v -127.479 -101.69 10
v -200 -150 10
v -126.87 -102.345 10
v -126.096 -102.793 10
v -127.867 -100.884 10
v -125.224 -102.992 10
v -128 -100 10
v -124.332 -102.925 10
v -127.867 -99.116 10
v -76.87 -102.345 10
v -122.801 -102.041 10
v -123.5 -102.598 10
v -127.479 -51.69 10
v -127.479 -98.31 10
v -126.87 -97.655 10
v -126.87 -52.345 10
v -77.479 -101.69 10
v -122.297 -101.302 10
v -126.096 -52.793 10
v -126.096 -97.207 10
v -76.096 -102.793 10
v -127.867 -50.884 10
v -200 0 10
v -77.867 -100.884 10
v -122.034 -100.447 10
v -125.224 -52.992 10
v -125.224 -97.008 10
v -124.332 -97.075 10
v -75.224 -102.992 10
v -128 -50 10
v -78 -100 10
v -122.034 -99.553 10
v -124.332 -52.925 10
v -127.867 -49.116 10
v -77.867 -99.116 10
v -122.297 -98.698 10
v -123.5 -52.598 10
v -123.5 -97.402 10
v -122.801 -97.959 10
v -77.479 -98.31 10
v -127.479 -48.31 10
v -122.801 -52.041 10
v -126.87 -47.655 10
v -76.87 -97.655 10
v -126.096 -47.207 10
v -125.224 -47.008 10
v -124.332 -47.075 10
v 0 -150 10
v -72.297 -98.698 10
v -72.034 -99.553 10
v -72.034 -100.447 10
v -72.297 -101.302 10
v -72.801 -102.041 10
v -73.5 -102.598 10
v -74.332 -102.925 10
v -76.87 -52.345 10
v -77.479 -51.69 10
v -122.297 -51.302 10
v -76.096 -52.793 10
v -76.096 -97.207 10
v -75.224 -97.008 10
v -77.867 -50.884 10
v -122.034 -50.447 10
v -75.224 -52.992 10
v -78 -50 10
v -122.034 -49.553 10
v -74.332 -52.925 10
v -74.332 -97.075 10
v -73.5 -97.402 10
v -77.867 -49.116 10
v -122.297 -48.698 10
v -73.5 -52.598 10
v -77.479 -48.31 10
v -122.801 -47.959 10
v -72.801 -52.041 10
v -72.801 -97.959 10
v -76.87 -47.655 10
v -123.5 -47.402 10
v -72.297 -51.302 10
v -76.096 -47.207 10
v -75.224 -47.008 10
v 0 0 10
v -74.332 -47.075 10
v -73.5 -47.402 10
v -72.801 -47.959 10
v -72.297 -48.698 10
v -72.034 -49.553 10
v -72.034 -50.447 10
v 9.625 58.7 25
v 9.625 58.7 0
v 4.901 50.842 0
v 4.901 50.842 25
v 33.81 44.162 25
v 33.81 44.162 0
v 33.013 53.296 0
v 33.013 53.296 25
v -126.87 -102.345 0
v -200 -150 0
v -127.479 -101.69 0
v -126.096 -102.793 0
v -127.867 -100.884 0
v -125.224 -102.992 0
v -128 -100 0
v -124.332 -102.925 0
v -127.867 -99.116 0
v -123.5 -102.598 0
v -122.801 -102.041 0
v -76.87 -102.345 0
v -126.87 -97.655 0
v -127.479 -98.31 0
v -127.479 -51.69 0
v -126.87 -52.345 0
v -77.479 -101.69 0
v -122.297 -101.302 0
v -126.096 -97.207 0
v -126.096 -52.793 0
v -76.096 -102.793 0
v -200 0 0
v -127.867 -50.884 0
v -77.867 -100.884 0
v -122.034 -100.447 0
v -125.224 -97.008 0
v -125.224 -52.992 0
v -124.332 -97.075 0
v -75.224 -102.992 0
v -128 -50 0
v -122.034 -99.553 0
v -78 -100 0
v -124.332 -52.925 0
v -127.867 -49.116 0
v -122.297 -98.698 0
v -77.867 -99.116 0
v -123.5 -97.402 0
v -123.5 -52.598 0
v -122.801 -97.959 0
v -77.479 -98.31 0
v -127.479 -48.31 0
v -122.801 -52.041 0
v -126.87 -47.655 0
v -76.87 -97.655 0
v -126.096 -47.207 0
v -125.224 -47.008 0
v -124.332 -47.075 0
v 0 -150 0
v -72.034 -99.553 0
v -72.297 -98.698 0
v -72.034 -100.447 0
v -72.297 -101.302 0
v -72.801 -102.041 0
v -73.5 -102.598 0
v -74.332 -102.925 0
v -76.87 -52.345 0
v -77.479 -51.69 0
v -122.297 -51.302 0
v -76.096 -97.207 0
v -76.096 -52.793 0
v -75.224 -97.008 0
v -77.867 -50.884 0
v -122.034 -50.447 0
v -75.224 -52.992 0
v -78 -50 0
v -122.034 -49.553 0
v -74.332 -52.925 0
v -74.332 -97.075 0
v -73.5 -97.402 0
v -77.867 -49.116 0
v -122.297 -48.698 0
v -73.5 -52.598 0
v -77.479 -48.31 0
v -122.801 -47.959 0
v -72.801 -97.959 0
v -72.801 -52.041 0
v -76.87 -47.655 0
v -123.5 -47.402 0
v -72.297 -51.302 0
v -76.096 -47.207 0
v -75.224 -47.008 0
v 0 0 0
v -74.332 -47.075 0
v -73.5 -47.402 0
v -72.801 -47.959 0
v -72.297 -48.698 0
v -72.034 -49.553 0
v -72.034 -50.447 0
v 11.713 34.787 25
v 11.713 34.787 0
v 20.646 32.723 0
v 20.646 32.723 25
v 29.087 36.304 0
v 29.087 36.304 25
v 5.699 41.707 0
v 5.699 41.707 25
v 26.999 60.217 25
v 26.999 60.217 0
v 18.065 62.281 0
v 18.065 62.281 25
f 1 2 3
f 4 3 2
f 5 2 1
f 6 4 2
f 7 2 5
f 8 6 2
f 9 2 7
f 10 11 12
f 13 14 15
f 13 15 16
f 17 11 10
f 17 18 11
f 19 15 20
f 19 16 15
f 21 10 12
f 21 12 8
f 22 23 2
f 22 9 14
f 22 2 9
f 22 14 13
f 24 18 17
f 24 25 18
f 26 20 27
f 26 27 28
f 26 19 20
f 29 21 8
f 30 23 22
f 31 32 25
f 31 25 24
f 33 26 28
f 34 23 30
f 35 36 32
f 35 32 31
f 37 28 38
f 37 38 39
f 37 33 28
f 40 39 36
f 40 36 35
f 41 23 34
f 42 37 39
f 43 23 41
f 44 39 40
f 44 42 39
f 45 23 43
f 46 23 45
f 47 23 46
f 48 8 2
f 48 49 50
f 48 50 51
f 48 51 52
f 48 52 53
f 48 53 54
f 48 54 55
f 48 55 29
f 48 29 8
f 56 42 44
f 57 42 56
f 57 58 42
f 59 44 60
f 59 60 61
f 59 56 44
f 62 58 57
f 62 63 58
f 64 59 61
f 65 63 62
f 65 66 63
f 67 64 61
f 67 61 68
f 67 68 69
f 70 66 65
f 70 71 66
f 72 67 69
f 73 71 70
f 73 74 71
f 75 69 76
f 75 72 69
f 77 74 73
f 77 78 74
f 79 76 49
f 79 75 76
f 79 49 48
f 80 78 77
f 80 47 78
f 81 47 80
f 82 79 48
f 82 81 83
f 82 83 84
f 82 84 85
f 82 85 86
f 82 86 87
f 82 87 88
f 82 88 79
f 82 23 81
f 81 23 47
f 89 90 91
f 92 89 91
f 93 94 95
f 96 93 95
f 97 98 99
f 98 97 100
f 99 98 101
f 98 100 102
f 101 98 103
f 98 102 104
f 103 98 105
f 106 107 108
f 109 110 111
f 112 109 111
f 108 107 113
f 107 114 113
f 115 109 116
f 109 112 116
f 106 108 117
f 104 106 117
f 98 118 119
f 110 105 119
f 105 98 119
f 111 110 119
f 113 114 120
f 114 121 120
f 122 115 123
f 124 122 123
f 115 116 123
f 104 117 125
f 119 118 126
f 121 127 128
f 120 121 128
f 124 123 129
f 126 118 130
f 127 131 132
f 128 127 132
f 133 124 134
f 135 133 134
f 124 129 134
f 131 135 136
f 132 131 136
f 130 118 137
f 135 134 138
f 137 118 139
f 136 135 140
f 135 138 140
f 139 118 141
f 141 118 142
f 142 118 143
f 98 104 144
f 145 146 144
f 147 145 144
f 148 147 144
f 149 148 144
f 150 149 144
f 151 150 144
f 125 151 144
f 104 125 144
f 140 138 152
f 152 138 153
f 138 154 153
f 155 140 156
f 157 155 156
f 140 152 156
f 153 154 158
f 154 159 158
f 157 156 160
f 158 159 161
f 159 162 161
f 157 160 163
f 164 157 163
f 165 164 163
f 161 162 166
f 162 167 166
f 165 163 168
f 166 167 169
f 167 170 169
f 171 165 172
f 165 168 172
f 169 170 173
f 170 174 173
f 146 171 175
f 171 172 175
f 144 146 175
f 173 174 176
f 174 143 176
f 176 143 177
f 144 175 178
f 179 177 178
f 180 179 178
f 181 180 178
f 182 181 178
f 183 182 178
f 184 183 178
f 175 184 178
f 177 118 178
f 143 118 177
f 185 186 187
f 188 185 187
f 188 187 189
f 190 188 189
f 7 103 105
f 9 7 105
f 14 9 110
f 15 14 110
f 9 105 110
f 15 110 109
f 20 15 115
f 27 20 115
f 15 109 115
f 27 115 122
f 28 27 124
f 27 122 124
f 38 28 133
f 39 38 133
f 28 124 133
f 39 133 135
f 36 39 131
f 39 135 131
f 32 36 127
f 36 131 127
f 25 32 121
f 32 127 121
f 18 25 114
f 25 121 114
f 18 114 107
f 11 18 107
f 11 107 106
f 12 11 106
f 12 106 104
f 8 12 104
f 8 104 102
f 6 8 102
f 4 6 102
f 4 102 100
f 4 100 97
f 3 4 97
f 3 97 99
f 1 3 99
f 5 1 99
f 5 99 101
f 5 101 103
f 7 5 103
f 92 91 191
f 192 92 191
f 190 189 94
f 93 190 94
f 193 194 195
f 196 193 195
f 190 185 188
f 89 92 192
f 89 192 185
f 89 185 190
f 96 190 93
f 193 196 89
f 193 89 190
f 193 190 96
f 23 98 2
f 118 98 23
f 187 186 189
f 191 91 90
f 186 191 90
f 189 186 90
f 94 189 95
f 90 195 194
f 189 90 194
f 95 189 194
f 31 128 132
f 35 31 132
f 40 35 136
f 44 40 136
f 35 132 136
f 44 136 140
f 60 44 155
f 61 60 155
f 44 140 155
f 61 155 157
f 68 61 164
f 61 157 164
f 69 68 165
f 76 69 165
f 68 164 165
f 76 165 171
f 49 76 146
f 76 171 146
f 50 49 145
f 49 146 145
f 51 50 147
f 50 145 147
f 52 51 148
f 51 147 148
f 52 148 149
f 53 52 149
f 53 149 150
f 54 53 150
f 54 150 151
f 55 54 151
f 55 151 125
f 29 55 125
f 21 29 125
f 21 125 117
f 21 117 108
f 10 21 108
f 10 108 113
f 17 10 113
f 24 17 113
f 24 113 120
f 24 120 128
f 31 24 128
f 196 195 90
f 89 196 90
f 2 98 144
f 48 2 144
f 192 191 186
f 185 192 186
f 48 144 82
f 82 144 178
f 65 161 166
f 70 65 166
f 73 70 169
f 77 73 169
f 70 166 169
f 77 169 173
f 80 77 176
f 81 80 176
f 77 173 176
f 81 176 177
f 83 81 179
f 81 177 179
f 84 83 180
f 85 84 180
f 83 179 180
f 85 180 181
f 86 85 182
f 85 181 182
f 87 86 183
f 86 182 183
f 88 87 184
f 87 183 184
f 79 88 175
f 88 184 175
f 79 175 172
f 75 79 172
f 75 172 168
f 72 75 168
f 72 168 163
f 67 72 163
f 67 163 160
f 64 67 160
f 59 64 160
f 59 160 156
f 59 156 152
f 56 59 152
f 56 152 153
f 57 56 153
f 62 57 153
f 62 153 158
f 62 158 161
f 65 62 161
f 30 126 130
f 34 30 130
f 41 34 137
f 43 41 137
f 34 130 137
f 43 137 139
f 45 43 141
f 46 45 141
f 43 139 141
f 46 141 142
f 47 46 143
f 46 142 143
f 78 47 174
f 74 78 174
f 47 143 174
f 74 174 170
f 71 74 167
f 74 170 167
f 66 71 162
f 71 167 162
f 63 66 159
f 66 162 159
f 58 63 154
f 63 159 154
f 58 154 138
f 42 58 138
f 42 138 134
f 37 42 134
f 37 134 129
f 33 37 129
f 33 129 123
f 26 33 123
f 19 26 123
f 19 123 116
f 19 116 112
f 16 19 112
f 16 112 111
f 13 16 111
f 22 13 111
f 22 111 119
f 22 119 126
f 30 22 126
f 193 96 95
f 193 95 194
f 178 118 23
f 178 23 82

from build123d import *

# Parameters (mm, degrees)
F0_W     = 200
F0_H     = 150
F1_DEPTH = 10
F3_D     = 6
F5_DEPTH = 25


with BuildPart() as f1:
    # F0 (on Top) → F1 (new body)
    with BuildSketch(Plane.XY):
        with Locations((-100, -75)):
            Rectangle(F0_W, F0_H)
    extrude(amount=F1_DEPTH)

    # F3 (through all)
    with Locations(Plane.XY.offset(10)):
        with Locations((-125, -50), (-75, -50), (-75, -100), (-125, -100)):
            Hole(F3_D / 2)


with BuildPart() as f5:
    # F4 (on Top) → F5 (new body)
    with BuildSketch(Plane.XY):
        Polygon((11.712731, 34.78662), (20.646203, 32.722555), (29.086761, 36.303655), (33.810398, 44.16206), (33.012846, 53.296128), (26.998742, 60.216955), (18.06527, 62.28102), (9.624712, 58.69992), (4.901075, 50.841515), (5.698627, 41.707447), align=None)
    extrude(amount=F5_DEPTH)


solid = Compound([f1.part, f5.part])
